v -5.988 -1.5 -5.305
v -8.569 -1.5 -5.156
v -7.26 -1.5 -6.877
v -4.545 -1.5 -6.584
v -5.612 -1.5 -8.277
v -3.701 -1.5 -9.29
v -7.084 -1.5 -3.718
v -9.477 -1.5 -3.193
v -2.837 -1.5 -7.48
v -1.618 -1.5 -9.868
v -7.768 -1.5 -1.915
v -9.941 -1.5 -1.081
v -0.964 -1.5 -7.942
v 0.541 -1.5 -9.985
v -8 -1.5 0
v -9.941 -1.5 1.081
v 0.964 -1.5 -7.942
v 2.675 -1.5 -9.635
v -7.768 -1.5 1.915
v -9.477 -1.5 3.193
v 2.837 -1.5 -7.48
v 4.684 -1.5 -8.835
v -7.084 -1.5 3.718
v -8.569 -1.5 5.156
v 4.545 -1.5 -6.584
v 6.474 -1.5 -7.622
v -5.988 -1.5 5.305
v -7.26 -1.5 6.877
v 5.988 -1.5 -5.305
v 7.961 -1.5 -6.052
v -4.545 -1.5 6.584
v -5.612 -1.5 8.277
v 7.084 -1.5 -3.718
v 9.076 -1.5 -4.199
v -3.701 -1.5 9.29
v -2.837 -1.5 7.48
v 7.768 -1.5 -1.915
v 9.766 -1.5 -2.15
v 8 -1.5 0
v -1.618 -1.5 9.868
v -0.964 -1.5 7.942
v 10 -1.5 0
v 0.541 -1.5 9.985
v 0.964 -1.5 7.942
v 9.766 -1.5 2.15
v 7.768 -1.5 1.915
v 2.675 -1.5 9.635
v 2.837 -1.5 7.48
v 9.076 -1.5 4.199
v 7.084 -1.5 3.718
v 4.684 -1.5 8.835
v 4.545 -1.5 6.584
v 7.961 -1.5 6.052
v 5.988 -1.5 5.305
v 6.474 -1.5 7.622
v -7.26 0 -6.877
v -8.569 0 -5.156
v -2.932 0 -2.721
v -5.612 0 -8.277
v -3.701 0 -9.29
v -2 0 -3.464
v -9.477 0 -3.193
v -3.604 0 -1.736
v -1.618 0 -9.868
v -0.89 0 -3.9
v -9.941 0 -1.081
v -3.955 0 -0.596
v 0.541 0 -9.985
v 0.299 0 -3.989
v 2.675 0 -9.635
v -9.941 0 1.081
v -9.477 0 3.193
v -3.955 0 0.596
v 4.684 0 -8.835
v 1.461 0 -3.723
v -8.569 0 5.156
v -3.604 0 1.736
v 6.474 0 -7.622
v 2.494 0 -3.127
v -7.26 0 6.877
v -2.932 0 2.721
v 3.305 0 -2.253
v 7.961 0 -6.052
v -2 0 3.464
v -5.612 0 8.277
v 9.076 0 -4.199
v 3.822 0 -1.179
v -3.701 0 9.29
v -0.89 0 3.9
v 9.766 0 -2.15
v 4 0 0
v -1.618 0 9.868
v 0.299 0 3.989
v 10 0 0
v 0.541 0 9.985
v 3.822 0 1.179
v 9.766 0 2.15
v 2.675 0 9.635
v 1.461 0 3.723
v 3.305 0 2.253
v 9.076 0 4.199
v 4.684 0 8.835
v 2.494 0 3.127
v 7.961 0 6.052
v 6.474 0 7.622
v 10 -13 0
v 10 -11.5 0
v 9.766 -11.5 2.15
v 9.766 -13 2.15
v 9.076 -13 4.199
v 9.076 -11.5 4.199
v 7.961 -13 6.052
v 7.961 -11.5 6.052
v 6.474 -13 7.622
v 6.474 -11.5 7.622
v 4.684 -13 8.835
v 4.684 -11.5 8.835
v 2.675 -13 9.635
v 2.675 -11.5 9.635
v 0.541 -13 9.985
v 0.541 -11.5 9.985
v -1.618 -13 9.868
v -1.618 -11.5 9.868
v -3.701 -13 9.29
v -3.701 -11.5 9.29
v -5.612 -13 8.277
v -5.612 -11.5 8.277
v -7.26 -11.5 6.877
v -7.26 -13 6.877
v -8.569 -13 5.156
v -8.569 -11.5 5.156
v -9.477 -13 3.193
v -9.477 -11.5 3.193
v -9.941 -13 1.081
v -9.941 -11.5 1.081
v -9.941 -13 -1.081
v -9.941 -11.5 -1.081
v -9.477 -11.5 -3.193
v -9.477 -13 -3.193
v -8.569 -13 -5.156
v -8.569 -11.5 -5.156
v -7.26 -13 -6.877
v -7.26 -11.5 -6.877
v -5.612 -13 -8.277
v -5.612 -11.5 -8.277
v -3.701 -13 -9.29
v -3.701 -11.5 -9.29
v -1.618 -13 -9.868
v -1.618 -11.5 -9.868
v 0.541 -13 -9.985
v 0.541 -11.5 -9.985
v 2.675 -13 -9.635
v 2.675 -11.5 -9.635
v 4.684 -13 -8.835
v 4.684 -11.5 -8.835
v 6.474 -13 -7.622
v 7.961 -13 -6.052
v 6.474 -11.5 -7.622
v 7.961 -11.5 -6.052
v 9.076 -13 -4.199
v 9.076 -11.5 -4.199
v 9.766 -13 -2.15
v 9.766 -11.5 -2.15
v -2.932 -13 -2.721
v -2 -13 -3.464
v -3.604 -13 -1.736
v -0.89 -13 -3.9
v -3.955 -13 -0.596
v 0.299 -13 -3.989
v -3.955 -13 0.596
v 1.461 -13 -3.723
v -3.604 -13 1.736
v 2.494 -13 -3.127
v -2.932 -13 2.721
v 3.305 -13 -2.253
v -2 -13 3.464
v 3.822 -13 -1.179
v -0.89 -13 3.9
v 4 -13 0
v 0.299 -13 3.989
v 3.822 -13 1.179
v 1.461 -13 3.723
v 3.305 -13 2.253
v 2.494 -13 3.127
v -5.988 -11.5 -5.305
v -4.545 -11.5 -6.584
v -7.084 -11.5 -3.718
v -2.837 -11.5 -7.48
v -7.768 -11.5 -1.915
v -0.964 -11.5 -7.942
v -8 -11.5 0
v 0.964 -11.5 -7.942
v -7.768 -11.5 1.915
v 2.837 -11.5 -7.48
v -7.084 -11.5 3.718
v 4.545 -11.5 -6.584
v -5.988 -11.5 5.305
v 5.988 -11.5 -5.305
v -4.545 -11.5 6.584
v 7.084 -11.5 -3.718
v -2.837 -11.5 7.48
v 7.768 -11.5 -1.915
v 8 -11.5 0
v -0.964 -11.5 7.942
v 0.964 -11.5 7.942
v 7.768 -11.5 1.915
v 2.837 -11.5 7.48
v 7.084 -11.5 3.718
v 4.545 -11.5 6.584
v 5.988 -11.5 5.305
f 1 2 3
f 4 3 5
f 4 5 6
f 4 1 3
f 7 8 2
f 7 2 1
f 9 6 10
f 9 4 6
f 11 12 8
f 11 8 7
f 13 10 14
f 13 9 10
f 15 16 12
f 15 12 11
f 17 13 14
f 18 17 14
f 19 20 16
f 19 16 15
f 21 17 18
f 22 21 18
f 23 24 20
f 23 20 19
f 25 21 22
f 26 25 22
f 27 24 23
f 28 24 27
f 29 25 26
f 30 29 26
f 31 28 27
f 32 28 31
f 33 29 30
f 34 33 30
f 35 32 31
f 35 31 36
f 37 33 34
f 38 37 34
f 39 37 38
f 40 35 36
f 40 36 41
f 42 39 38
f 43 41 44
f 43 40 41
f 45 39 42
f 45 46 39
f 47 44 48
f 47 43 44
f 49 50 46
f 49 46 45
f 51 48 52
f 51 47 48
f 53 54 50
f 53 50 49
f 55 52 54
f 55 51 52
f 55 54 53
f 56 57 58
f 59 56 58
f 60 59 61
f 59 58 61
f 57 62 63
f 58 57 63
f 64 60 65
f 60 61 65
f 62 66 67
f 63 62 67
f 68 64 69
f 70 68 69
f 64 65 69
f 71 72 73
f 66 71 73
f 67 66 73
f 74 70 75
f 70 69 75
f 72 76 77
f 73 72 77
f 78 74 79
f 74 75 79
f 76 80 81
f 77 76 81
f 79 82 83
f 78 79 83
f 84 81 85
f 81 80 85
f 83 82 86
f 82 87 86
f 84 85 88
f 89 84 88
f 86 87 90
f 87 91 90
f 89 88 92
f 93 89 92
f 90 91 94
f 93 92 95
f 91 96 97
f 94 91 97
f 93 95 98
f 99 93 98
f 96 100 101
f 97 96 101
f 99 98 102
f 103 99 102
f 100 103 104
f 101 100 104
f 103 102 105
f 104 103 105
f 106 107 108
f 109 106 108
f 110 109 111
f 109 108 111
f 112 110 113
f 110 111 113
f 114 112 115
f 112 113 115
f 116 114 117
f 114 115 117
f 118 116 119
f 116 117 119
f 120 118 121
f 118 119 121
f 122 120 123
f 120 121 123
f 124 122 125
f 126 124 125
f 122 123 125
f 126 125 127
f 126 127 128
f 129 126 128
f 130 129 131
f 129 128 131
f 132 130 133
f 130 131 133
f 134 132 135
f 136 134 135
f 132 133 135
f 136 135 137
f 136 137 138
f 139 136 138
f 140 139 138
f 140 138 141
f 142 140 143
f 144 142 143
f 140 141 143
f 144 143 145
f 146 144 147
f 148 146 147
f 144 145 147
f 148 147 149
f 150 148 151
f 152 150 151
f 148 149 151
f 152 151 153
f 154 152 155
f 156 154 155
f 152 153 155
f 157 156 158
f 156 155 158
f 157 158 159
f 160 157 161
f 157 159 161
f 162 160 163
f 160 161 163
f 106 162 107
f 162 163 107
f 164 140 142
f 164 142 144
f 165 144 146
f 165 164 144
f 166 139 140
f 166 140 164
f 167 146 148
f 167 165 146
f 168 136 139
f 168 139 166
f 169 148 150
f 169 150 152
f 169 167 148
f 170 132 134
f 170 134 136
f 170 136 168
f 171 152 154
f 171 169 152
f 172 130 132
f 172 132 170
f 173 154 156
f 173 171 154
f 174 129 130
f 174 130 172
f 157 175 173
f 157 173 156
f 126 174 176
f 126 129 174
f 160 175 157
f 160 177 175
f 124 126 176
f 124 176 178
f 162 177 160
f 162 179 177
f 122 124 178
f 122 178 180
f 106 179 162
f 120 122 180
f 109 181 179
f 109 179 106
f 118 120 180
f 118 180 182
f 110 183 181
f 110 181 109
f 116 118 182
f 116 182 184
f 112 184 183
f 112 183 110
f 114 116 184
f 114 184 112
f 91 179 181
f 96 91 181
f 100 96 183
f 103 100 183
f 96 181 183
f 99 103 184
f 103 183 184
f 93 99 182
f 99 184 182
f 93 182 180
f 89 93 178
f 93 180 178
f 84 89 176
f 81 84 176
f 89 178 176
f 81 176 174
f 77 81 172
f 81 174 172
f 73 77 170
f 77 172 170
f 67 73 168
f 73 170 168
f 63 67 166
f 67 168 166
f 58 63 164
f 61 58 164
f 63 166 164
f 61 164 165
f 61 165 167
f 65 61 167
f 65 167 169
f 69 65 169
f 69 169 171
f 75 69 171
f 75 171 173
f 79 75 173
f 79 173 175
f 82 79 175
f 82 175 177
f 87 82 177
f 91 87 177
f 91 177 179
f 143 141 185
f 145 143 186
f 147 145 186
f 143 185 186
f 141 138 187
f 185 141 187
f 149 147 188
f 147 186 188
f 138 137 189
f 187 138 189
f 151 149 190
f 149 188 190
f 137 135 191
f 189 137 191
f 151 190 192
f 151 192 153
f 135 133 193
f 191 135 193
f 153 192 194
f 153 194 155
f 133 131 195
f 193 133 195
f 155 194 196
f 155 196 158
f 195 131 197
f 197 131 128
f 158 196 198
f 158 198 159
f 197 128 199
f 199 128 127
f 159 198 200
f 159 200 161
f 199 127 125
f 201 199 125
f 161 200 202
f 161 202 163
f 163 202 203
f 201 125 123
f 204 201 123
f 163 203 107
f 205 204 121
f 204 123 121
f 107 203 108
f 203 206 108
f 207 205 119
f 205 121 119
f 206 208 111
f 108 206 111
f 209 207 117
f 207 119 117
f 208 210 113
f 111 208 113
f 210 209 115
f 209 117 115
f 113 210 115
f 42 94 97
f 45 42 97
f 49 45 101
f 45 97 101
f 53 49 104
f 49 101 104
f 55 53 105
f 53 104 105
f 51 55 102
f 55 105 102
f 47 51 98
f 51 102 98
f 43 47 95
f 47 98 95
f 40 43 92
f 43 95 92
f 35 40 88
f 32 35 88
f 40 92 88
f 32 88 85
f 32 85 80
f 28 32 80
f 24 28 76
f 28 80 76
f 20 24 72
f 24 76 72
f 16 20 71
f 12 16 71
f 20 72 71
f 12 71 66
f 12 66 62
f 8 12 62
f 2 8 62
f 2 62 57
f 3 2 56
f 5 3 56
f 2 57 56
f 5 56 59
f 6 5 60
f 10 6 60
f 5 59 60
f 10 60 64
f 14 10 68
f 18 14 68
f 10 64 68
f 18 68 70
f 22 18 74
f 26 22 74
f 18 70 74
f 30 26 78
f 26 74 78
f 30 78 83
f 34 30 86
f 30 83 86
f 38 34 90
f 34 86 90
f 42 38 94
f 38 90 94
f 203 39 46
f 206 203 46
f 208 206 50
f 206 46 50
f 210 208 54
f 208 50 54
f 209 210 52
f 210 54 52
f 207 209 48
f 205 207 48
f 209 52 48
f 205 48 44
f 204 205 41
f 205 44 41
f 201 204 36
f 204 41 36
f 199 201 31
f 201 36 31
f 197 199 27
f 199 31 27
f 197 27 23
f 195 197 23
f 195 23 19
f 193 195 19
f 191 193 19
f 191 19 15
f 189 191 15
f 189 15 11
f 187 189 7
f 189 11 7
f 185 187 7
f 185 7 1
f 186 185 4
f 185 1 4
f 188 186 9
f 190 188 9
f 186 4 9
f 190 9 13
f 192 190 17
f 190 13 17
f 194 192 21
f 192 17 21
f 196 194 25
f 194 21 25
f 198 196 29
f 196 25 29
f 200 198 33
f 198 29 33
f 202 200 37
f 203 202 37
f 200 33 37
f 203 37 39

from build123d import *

# Parameters (mm, degrees)
F0_R     = 10
F1_DEPTH = 1.5
F2_R     = 8
F3_DEPTH = 10
F4_R     = 10
F5_DEPTH = 1.5
F6_R     = 4
F7_DEPTH = 25


with BuildPart() as f1:
    # F0 (on Front) → F1 (new body)
    with BuildSketch(Plane.XZ):
        Circle(F0_R)
    extrude(amount=F1_DEPTH)

    # F2 (on face) → F3 (join)
    with BuildSketch(Plane.XZ.offset(1.5)):
        Circle(F2_R)
    extrude(amount=F3_DEPTH)

    # F4 (on face) → F5 (join)
    with BuildSketch(Plane.XZ.offset(11.5)):
        Circle(F4_R)
    extrude(amount=F5_DEPTH)

    # F6 (on face) → F7 (cut)
    with BuildSketch(Plane.XZ.offset(13)):
        Circle(F6_R)
    extrude(amount=-F7_DEPTH, mode=Mode.SUBTRACT)


solid = f1.part
